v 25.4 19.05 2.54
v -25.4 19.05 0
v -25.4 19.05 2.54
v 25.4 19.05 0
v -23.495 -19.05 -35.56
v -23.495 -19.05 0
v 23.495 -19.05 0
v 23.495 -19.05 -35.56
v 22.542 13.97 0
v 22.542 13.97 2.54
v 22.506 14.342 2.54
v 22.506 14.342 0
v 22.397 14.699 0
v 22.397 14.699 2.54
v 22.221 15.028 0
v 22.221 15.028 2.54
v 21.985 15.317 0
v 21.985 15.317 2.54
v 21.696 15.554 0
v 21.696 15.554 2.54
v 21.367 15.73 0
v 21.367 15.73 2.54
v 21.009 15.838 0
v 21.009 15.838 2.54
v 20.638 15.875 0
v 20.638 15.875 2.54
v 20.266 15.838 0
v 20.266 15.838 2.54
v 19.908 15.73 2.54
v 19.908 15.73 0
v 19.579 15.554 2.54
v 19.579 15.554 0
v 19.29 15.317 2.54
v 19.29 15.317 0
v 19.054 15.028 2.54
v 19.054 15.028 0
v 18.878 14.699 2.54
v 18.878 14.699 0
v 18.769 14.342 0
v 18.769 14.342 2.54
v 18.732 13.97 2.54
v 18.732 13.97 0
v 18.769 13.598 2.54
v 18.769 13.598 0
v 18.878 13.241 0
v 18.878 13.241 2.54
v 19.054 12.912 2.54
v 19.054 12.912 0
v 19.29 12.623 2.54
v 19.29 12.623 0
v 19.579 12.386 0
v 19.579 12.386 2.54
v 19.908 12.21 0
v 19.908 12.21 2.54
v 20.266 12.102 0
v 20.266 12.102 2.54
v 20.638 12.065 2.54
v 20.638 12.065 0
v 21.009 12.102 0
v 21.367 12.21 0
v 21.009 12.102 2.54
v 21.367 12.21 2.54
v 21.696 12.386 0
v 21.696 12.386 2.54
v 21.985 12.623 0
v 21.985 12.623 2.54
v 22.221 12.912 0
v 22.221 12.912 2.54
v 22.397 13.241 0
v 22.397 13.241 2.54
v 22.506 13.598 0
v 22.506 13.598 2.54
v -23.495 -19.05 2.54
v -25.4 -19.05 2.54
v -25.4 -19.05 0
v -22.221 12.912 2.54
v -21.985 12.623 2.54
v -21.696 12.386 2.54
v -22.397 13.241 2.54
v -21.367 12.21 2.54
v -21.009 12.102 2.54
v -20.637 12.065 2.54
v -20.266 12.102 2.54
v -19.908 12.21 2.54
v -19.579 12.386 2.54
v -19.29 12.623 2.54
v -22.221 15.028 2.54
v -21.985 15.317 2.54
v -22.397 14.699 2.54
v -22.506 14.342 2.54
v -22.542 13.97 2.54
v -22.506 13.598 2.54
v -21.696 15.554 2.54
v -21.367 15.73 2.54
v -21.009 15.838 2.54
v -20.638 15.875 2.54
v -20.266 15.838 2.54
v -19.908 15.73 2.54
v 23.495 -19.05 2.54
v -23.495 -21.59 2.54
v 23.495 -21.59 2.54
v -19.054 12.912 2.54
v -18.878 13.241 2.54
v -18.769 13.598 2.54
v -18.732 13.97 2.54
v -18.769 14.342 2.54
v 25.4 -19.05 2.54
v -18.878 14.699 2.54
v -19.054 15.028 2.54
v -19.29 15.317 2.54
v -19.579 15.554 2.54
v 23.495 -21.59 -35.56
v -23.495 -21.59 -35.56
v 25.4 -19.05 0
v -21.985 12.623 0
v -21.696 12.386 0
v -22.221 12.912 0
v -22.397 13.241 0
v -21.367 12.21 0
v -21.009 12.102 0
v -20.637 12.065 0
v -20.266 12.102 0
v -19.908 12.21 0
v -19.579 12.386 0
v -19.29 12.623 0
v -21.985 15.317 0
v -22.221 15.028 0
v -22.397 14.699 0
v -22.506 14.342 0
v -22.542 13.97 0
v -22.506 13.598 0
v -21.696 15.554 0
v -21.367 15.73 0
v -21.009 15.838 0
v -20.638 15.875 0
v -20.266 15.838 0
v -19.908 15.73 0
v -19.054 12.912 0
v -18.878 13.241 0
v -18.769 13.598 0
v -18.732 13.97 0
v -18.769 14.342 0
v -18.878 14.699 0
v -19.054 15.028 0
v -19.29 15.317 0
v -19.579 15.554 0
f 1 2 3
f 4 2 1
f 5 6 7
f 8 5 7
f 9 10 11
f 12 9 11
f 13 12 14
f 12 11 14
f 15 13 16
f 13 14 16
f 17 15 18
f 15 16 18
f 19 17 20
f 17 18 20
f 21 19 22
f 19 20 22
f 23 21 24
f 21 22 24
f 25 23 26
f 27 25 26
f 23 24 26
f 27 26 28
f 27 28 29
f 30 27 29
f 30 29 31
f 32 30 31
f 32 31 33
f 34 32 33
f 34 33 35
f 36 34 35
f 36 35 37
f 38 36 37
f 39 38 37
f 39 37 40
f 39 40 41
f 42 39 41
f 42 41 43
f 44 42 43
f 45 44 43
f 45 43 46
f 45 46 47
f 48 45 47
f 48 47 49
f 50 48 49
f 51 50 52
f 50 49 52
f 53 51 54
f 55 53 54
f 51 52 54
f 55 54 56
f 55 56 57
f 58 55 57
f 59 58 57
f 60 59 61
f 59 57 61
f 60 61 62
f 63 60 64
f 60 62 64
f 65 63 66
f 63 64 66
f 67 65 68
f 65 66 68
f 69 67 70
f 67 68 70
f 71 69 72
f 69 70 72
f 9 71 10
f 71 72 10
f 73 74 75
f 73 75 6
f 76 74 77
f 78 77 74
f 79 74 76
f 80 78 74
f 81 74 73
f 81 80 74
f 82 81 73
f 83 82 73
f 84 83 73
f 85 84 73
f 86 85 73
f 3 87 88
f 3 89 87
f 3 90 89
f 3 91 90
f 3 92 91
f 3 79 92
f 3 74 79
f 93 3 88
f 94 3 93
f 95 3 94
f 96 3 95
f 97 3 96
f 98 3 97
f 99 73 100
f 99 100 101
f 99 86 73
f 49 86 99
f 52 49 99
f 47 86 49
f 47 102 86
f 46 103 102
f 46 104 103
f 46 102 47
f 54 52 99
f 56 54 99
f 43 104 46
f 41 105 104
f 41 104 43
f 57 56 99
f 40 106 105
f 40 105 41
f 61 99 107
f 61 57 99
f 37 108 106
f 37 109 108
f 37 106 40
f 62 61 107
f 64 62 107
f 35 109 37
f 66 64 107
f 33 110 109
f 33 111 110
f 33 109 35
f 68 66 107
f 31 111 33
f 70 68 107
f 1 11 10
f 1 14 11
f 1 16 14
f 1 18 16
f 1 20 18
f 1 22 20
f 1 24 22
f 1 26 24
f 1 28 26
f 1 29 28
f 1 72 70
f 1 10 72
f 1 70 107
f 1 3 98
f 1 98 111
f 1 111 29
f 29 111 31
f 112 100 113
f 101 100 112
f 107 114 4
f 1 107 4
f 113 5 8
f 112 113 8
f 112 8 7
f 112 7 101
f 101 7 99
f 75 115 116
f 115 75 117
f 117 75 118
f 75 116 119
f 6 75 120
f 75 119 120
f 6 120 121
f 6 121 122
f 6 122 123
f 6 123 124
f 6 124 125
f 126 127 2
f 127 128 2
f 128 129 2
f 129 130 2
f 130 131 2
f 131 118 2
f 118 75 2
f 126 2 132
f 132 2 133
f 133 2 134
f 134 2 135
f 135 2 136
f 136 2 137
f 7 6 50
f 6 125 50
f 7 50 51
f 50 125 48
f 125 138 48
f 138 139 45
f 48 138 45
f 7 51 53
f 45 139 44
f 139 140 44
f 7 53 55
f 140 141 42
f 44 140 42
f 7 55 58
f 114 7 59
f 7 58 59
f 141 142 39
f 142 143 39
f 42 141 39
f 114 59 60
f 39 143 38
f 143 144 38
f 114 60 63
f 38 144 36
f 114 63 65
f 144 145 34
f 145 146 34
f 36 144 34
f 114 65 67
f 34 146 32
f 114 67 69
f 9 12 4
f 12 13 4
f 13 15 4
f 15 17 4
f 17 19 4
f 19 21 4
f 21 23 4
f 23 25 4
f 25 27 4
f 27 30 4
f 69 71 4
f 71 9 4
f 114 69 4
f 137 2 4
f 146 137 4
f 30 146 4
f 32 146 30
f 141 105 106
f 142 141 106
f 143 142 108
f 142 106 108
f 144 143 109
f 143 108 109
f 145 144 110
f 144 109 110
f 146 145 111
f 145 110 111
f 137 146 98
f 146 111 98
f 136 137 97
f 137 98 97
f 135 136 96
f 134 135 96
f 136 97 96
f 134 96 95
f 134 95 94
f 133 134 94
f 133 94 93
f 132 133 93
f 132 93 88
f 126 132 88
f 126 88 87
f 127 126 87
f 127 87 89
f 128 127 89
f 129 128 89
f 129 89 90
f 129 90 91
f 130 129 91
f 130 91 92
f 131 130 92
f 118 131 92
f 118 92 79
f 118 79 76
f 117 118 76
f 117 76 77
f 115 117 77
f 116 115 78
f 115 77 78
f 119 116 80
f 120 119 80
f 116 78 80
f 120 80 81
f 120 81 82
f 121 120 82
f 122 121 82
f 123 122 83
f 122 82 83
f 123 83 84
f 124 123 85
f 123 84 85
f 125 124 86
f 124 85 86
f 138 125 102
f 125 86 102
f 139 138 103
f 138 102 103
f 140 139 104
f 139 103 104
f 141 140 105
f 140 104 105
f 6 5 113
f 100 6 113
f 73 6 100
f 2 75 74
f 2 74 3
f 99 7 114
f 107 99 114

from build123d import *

# Parameters (mm, degrees)
F0_W     = 50.8
F0_H     = 38.1
F1_DEPTH = 2.54
F2_W     = 46.99
F2_H     = 38.1
F3_DEPTH = 2.54
F4_R     = 1.905
F5_DEPTH = 38.101


with BuildPart() as f1:
    # F0 (on Top) → F1 (new body)
    with BuildSketch(Plane.XY):
        Rectangle(F0_W, F0_H)
    extrude(amount=F1_DEPTH)

    # F2 (on face) → F3 (join)
    with BuildSketch(Plane.XZ.offset(19.05)):
        with Locations((0, -16.51)):
            Rectangle(F2_W, F2_H)
    extrude(amount=F3_DEPTH)

    # F4 (on face) → F5 (cut, through all)
    with BuildSketch(Plane.XY.offset(2.54)):
        with Locations((20.6375, 13.97)):
            Circle(F4_R)
        with Locations((-20.6375, 13.97)):
            Circle(F4_R)
    extrude(amount=-F5_DEPTH, mode=Mode.SUBTRACT)


solid = f1.part
